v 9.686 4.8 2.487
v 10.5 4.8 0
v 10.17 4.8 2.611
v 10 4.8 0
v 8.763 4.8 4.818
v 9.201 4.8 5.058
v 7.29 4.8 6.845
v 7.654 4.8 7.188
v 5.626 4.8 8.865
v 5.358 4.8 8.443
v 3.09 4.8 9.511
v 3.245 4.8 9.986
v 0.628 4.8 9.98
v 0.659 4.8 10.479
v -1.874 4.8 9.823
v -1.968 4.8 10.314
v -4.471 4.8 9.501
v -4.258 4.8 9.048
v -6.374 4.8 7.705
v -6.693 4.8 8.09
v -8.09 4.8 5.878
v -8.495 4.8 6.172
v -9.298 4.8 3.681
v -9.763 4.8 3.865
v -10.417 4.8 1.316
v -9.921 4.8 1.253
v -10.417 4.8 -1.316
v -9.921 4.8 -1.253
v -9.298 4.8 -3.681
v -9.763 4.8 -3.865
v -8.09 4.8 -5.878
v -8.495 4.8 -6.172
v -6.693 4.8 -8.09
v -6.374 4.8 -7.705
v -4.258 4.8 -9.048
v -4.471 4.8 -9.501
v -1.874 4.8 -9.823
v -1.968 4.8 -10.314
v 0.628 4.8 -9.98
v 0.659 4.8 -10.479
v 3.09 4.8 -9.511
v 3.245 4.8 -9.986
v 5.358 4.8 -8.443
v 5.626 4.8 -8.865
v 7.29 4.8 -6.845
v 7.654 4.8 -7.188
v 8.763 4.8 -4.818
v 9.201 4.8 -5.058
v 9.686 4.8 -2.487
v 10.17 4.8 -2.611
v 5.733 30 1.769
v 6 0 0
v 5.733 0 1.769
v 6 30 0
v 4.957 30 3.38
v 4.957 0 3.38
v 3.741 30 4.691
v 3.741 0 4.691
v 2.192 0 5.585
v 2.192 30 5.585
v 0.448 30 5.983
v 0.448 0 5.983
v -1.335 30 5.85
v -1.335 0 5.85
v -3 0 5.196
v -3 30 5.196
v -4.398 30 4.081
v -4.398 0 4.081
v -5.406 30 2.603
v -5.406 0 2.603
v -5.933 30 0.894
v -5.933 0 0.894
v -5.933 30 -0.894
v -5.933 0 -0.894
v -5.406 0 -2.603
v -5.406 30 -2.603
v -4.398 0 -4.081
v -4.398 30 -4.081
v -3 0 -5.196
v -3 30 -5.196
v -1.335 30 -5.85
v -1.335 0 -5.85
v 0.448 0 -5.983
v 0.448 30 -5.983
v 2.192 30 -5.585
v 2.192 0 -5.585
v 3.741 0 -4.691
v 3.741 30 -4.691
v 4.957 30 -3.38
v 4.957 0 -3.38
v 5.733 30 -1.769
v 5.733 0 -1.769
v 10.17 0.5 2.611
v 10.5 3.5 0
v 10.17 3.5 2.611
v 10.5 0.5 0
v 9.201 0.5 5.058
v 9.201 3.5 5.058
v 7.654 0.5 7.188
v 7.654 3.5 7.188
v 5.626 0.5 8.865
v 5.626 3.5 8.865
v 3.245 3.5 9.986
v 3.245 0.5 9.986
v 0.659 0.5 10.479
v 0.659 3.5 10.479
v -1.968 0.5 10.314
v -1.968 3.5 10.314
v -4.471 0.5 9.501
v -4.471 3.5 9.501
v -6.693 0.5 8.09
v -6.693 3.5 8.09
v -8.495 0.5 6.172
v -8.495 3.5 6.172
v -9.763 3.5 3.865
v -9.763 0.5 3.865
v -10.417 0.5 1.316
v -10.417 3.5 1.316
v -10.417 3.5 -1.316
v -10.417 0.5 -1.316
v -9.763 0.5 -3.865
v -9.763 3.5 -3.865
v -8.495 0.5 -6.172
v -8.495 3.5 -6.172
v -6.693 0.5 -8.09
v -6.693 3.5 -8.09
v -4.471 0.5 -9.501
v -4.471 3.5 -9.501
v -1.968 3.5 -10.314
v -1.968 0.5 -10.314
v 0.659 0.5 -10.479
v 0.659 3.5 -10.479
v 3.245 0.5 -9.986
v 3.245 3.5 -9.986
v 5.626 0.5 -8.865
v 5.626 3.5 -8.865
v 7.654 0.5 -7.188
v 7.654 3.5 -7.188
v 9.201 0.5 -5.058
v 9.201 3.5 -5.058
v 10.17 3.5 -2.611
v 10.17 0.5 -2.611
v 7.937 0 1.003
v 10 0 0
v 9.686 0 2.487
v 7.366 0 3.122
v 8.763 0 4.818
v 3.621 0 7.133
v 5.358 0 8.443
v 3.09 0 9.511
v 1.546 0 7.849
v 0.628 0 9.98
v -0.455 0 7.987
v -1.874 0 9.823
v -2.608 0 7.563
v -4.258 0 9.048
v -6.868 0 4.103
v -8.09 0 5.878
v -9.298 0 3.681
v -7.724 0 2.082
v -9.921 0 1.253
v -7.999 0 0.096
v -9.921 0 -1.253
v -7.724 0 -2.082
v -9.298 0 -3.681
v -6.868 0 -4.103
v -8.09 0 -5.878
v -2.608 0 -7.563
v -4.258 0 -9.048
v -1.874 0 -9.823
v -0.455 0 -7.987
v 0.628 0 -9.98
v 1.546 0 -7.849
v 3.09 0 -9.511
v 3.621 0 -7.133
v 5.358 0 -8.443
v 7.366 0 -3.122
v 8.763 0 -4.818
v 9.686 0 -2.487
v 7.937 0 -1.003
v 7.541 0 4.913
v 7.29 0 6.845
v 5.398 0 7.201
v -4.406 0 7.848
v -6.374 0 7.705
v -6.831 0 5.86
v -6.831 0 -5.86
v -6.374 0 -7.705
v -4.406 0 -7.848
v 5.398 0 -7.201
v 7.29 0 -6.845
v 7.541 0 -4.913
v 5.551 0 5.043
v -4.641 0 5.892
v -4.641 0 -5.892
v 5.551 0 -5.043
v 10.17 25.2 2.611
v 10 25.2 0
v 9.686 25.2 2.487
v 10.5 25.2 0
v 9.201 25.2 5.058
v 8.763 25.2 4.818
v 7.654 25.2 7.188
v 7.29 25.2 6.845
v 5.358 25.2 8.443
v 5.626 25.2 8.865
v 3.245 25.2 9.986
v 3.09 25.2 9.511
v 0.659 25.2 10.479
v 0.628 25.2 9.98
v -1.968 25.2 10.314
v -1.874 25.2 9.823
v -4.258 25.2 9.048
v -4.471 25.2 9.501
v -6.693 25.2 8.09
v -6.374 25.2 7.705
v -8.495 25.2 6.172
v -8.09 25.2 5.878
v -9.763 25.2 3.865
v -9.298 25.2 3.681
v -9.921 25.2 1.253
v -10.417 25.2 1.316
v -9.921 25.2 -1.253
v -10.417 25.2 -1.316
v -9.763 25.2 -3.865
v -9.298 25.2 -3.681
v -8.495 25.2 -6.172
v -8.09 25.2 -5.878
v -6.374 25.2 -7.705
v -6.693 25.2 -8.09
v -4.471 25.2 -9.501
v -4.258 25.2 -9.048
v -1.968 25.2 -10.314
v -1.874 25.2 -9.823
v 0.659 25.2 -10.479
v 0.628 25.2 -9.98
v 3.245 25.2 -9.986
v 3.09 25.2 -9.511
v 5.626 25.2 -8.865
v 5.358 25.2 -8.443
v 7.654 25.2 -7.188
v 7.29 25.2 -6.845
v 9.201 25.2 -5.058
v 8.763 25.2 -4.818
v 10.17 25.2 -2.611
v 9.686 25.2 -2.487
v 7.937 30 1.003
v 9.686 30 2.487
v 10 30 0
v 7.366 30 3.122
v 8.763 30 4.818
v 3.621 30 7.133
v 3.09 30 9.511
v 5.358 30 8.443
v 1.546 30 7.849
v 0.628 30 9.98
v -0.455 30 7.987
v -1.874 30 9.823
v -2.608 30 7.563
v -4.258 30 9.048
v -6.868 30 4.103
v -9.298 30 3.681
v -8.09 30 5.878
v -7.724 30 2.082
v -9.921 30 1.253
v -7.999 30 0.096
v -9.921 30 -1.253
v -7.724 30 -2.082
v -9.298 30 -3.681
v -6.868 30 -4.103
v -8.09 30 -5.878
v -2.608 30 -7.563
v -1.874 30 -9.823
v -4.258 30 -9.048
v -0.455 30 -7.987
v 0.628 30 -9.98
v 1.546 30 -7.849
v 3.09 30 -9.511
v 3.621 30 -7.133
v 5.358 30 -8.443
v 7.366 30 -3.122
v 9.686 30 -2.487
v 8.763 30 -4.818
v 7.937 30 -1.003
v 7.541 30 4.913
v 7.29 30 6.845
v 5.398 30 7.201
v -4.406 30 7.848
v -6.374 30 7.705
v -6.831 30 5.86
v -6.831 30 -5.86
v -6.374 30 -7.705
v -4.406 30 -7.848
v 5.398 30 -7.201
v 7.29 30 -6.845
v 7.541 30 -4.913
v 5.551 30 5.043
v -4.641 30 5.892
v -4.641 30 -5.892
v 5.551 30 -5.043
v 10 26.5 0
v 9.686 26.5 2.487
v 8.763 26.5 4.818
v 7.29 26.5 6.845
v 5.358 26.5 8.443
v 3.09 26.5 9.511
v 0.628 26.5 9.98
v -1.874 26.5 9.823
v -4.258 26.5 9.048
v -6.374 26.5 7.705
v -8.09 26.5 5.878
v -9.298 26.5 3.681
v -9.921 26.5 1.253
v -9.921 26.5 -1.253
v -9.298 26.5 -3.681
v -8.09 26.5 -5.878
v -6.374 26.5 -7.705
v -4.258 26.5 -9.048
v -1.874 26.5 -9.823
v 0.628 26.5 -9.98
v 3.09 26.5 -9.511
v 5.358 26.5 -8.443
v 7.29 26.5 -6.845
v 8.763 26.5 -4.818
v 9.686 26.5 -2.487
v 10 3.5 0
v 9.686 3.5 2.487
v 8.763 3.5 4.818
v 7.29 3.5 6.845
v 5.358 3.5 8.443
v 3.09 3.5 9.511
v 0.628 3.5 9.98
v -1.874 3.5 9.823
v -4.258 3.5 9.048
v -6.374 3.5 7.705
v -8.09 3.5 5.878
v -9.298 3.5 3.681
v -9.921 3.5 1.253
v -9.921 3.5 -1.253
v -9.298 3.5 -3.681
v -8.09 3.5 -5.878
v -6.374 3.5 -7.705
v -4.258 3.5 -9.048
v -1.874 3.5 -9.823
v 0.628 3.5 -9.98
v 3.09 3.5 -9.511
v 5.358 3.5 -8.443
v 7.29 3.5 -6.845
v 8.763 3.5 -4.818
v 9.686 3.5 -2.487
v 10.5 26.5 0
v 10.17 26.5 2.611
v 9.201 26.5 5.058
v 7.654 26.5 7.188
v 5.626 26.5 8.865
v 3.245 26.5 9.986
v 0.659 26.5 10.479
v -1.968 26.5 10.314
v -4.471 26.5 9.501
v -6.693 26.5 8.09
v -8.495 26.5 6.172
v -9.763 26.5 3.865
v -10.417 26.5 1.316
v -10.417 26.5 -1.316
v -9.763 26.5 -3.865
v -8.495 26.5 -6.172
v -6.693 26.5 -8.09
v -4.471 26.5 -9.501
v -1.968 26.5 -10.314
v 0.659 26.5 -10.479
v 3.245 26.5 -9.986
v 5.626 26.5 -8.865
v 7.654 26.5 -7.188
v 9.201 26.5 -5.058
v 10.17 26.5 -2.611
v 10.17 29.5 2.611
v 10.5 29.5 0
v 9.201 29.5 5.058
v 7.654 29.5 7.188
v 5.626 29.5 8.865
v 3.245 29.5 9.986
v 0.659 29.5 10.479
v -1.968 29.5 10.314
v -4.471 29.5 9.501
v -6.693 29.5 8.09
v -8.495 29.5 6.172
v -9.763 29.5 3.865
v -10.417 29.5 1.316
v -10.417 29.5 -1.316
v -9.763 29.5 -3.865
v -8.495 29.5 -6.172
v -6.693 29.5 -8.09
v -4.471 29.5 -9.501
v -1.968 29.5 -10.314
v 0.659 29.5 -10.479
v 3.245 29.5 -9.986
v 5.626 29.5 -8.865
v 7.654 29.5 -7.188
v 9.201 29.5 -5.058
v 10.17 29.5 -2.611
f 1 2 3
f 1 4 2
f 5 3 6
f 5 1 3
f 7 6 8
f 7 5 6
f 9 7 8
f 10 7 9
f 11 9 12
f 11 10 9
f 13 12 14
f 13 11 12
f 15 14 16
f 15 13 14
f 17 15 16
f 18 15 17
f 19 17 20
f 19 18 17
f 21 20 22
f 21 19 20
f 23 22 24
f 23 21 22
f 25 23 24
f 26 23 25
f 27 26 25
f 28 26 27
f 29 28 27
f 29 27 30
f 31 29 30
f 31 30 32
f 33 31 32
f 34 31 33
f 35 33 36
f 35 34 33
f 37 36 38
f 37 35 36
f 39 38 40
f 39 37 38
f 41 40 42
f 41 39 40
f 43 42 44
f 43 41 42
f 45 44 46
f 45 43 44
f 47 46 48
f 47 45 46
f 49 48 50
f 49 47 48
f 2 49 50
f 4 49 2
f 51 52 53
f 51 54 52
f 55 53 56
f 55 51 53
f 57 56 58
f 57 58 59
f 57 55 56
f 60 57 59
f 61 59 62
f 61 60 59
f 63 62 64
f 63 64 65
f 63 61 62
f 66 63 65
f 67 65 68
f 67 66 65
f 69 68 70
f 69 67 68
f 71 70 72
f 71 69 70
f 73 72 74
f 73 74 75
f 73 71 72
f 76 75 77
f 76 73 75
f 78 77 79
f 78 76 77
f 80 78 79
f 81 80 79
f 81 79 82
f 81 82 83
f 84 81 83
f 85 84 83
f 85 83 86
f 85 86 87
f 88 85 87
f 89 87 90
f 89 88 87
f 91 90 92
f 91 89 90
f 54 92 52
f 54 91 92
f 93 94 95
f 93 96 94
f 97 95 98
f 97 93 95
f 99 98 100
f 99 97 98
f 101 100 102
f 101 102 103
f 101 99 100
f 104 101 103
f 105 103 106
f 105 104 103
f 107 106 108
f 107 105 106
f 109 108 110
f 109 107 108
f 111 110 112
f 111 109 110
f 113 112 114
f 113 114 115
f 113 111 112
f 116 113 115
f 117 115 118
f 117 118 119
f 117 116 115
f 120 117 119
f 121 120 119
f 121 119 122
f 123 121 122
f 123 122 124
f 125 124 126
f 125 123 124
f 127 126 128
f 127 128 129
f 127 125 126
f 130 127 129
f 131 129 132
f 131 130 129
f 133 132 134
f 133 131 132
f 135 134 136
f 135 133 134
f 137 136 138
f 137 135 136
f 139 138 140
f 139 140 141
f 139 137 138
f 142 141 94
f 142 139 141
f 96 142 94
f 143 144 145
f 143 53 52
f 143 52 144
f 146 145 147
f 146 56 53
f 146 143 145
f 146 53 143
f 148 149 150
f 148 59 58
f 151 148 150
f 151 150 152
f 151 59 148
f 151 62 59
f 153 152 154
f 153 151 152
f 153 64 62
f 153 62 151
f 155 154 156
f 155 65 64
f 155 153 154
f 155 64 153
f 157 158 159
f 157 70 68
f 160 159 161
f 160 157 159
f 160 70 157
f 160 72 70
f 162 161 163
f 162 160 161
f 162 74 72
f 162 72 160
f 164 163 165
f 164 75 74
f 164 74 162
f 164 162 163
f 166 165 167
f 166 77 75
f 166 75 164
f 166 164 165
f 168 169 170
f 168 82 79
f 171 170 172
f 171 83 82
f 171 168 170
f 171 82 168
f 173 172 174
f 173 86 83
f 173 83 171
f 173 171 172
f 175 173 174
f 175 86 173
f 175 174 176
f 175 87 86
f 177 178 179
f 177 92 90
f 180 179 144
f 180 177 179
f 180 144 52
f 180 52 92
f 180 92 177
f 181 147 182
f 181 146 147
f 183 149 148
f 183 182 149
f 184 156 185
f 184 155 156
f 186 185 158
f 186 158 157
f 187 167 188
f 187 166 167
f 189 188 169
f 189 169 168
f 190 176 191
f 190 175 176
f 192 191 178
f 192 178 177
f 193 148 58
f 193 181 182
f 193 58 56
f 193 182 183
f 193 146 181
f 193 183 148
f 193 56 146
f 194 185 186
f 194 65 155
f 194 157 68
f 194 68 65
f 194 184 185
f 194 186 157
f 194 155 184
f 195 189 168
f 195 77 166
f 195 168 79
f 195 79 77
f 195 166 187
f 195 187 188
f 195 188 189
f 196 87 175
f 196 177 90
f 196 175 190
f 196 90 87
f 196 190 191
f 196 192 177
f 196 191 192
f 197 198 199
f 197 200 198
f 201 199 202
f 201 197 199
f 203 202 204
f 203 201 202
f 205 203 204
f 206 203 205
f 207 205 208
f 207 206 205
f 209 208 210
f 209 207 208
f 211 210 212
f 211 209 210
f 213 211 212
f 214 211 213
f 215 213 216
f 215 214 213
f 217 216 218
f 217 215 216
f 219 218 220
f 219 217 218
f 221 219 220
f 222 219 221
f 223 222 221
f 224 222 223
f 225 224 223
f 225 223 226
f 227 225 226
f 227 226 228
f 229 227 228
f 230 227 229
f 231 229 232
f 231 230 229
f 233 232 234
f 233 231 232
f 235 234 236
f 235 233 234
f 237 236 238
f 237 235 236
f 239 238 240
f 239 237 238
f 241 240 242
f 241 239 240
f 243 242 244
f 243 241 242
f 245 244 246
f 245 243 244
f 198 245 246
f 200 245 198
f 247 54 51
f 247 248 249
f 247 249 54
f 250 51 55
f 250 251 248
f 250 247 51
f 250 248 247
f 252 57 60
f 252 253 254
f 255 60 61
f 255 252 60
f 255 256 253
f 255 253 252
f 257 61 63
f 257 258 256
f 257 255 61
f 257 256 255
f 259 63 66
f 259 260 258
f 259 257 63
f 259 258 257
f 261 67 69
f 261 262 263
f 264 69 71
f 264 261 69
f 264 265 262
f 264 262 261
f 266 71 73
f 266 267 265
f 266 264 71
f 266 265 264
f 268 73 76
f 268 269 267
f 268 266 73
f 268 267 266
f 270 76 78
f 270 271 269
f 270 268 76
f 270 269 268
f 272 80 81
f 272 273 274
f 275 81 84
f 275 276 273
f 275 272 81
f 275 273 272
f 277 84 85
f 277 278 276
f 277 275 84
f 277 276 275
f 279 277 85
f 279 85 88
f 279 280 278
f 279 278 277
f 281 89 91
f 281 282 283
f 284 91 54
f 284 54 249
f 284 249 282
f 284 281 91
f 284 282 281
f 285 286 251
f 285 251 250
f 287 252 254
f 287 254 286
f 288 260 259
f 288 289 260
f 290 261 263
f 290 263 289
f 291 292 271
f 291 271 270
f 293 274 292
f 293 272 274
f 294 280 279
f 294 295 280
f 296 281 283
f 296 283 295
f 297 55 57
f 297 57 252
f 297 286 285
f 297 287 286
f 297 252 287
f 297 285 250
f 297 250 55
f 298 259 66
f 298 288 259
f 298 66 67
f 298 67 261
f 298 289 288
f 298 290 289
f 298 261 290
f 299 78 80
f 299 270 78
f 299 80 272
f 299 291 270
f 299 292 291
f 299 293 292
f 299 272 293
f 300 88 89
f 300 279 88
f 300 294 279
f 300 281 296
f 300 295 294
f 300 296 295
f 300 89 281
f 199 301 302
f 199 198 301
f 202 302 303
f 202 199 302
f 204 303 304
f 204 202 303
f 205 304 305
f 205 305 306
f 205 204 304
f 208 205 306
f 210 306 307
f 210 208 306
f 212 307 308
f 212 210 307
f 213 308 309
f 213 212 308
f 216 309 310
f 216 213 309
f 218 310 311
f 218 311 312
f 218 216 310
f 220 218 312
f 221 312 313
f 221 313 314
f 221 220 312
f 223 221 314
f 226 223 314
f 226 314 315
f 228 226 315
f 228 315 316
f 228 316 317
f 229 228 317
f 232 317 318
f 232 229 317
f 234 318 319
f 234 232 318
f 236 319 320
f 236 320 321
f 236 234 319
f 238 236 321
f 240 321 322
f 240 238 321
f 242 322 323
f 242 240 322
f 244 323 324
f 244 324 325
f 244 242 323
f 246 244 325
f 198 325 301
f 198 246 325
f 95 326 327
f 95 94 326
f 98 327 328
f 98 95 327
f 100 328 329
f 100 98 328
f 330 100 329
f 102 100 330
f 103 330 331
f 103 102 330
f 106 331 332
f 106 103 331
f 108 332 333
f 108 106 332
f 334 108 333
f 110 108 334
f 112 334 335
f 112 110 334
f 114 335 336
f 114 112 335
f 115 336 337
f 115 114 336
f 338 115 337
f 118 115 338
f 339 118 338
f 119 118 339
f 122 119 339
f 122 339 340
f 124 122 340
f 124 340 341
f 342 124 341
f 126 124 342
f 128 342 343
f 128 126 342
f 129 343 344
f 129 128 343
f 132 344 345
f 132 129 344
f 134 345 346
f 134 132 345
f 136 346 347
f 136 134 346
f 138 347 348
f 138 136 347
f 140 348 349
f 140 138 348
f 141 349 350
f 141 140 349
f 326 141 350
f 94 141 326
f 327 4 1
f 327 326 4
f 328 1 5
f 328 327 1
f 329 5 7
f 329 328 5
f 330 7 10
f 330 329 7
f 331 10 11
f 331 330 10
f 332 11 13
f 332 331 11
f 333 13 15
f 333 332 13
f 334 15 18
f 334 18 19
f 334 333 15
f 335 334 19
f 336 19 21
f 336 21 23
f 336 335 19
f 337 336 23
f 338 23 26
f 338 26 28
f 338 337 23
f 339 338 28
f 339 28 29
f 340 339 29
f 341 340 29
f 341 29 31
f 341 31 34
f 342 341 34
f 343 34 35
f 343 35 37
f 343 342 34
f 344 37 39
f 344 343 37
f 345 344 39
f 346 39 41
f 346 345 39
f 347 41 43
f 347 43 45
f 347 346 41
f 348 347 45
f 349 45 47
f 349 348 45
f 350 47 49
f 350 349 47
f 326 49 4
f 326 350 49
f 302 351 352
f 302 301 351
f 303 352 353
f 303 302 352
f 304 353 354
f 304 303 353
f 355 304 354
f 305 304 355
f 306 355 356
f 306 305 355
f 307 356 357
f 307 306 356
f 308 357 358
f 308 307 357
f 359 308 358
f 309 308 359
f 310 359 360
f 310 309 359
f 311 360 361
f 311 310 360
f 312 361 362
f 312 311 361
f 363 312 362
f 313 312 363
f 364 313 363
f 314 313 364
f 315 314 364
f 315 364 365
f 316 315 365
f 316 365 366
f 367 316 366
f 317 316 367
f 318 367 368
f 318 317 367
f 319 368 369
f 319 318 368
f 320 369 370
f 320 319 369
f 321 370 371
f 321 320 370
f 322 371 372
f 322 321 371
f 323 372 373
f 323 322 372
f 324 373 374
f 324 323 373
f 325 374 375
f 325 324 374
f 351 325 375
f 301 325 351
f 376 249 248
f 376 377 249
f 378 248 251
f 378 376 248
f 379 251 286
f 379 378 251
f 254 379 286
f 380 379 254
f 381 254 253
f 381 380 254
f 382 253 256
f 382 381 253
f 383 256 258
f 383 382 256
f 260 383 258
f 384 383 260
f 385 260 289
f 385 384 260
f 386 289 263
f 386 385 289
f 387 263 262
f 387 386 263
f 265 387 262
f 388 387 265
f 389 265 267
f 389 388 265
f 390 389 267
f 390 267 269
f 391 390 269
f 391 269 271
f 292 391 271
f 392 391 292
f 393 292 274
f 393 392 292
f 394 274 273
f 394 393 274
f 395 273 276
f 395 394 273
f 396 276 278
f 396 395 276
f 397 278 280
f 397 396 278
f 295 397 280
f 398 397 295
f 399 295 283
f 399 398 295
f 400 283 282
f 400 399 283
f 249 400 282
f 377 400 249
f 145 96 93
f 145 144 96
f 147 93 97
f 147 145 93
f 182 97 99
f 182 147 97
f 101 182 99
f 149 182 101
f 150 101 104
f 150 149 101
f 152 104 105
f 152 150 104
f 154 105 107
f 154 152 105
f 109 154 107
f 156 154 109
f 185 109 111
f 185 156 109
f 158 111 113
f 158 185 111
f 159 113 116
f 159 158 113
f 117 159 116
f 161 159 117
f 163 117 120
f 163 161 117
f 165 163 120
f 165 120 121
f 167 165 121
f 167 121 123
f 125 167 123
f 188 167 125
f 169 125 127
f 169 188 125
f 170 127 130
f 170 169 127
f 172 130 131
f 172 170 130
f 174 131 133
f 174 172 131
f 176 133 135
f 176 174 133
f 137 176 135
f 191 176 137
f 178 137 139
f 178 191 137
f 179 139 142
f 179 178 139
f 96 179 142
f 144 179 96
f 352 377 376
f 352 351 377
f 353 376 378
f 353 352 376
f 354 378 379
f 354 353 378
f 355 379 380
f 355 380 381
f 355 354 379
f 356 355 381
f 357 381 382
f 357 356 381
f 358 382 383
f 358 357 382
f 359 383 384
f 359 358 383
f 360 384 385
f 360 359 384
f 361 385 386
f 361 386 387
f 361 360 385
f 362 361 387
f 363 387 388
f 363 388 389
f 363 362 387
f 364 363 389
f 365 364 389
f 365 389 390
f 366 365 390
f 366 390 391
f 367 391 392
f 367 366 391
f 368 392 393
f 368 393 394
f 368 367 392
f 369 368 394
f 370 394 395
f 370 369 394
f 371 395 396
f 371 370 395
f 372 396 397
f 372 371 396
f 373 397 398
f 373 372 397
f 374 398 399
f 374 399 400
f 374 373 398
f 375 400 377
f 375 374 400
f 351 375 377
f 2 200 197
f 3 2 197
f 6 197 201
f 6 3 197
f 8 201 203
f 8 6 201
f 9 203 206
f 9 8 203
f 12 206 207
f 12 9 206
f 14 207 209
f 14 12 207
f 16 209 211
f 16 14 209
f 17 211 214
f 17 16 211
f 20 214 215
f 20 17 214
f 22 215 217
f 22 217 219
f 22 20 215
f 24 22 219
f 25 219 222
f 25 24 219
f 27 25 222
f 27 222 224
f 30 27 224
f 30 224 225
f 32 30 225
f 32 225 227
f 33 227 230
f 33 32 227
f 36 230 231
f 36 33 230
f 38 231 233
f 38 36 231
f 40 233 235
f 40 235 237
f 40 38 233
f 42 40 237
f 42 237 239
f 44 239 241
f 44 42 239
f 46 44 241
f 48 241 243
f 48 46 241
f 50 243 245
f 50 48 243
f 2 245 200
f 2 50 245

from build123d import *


with BuildPart() as f2:
    # F2: sweep along a path in F0
    with BuildLine(Plane.XZ) as f2_path:
        CenterArc((0, 0), 6, 0, 360)
    # F1 (on Right) → F2 (sweep)
    with BuildSketch(Plane.YZ):
        Polygon((0, 10), (0, 6), (30, 6), (30, 10), (29.5, 10.5), (26.5, 10.5), (26.5, 10), (25.2, 10), (25.2, 10.5), (15, 10.5), (4.8, 10.5), (4.8, 10), (3.5, 10), (3.5, 10.5), (0.5, 10.5), align=None)
    sweep(path=f2_path.line)


solid = f2.part
